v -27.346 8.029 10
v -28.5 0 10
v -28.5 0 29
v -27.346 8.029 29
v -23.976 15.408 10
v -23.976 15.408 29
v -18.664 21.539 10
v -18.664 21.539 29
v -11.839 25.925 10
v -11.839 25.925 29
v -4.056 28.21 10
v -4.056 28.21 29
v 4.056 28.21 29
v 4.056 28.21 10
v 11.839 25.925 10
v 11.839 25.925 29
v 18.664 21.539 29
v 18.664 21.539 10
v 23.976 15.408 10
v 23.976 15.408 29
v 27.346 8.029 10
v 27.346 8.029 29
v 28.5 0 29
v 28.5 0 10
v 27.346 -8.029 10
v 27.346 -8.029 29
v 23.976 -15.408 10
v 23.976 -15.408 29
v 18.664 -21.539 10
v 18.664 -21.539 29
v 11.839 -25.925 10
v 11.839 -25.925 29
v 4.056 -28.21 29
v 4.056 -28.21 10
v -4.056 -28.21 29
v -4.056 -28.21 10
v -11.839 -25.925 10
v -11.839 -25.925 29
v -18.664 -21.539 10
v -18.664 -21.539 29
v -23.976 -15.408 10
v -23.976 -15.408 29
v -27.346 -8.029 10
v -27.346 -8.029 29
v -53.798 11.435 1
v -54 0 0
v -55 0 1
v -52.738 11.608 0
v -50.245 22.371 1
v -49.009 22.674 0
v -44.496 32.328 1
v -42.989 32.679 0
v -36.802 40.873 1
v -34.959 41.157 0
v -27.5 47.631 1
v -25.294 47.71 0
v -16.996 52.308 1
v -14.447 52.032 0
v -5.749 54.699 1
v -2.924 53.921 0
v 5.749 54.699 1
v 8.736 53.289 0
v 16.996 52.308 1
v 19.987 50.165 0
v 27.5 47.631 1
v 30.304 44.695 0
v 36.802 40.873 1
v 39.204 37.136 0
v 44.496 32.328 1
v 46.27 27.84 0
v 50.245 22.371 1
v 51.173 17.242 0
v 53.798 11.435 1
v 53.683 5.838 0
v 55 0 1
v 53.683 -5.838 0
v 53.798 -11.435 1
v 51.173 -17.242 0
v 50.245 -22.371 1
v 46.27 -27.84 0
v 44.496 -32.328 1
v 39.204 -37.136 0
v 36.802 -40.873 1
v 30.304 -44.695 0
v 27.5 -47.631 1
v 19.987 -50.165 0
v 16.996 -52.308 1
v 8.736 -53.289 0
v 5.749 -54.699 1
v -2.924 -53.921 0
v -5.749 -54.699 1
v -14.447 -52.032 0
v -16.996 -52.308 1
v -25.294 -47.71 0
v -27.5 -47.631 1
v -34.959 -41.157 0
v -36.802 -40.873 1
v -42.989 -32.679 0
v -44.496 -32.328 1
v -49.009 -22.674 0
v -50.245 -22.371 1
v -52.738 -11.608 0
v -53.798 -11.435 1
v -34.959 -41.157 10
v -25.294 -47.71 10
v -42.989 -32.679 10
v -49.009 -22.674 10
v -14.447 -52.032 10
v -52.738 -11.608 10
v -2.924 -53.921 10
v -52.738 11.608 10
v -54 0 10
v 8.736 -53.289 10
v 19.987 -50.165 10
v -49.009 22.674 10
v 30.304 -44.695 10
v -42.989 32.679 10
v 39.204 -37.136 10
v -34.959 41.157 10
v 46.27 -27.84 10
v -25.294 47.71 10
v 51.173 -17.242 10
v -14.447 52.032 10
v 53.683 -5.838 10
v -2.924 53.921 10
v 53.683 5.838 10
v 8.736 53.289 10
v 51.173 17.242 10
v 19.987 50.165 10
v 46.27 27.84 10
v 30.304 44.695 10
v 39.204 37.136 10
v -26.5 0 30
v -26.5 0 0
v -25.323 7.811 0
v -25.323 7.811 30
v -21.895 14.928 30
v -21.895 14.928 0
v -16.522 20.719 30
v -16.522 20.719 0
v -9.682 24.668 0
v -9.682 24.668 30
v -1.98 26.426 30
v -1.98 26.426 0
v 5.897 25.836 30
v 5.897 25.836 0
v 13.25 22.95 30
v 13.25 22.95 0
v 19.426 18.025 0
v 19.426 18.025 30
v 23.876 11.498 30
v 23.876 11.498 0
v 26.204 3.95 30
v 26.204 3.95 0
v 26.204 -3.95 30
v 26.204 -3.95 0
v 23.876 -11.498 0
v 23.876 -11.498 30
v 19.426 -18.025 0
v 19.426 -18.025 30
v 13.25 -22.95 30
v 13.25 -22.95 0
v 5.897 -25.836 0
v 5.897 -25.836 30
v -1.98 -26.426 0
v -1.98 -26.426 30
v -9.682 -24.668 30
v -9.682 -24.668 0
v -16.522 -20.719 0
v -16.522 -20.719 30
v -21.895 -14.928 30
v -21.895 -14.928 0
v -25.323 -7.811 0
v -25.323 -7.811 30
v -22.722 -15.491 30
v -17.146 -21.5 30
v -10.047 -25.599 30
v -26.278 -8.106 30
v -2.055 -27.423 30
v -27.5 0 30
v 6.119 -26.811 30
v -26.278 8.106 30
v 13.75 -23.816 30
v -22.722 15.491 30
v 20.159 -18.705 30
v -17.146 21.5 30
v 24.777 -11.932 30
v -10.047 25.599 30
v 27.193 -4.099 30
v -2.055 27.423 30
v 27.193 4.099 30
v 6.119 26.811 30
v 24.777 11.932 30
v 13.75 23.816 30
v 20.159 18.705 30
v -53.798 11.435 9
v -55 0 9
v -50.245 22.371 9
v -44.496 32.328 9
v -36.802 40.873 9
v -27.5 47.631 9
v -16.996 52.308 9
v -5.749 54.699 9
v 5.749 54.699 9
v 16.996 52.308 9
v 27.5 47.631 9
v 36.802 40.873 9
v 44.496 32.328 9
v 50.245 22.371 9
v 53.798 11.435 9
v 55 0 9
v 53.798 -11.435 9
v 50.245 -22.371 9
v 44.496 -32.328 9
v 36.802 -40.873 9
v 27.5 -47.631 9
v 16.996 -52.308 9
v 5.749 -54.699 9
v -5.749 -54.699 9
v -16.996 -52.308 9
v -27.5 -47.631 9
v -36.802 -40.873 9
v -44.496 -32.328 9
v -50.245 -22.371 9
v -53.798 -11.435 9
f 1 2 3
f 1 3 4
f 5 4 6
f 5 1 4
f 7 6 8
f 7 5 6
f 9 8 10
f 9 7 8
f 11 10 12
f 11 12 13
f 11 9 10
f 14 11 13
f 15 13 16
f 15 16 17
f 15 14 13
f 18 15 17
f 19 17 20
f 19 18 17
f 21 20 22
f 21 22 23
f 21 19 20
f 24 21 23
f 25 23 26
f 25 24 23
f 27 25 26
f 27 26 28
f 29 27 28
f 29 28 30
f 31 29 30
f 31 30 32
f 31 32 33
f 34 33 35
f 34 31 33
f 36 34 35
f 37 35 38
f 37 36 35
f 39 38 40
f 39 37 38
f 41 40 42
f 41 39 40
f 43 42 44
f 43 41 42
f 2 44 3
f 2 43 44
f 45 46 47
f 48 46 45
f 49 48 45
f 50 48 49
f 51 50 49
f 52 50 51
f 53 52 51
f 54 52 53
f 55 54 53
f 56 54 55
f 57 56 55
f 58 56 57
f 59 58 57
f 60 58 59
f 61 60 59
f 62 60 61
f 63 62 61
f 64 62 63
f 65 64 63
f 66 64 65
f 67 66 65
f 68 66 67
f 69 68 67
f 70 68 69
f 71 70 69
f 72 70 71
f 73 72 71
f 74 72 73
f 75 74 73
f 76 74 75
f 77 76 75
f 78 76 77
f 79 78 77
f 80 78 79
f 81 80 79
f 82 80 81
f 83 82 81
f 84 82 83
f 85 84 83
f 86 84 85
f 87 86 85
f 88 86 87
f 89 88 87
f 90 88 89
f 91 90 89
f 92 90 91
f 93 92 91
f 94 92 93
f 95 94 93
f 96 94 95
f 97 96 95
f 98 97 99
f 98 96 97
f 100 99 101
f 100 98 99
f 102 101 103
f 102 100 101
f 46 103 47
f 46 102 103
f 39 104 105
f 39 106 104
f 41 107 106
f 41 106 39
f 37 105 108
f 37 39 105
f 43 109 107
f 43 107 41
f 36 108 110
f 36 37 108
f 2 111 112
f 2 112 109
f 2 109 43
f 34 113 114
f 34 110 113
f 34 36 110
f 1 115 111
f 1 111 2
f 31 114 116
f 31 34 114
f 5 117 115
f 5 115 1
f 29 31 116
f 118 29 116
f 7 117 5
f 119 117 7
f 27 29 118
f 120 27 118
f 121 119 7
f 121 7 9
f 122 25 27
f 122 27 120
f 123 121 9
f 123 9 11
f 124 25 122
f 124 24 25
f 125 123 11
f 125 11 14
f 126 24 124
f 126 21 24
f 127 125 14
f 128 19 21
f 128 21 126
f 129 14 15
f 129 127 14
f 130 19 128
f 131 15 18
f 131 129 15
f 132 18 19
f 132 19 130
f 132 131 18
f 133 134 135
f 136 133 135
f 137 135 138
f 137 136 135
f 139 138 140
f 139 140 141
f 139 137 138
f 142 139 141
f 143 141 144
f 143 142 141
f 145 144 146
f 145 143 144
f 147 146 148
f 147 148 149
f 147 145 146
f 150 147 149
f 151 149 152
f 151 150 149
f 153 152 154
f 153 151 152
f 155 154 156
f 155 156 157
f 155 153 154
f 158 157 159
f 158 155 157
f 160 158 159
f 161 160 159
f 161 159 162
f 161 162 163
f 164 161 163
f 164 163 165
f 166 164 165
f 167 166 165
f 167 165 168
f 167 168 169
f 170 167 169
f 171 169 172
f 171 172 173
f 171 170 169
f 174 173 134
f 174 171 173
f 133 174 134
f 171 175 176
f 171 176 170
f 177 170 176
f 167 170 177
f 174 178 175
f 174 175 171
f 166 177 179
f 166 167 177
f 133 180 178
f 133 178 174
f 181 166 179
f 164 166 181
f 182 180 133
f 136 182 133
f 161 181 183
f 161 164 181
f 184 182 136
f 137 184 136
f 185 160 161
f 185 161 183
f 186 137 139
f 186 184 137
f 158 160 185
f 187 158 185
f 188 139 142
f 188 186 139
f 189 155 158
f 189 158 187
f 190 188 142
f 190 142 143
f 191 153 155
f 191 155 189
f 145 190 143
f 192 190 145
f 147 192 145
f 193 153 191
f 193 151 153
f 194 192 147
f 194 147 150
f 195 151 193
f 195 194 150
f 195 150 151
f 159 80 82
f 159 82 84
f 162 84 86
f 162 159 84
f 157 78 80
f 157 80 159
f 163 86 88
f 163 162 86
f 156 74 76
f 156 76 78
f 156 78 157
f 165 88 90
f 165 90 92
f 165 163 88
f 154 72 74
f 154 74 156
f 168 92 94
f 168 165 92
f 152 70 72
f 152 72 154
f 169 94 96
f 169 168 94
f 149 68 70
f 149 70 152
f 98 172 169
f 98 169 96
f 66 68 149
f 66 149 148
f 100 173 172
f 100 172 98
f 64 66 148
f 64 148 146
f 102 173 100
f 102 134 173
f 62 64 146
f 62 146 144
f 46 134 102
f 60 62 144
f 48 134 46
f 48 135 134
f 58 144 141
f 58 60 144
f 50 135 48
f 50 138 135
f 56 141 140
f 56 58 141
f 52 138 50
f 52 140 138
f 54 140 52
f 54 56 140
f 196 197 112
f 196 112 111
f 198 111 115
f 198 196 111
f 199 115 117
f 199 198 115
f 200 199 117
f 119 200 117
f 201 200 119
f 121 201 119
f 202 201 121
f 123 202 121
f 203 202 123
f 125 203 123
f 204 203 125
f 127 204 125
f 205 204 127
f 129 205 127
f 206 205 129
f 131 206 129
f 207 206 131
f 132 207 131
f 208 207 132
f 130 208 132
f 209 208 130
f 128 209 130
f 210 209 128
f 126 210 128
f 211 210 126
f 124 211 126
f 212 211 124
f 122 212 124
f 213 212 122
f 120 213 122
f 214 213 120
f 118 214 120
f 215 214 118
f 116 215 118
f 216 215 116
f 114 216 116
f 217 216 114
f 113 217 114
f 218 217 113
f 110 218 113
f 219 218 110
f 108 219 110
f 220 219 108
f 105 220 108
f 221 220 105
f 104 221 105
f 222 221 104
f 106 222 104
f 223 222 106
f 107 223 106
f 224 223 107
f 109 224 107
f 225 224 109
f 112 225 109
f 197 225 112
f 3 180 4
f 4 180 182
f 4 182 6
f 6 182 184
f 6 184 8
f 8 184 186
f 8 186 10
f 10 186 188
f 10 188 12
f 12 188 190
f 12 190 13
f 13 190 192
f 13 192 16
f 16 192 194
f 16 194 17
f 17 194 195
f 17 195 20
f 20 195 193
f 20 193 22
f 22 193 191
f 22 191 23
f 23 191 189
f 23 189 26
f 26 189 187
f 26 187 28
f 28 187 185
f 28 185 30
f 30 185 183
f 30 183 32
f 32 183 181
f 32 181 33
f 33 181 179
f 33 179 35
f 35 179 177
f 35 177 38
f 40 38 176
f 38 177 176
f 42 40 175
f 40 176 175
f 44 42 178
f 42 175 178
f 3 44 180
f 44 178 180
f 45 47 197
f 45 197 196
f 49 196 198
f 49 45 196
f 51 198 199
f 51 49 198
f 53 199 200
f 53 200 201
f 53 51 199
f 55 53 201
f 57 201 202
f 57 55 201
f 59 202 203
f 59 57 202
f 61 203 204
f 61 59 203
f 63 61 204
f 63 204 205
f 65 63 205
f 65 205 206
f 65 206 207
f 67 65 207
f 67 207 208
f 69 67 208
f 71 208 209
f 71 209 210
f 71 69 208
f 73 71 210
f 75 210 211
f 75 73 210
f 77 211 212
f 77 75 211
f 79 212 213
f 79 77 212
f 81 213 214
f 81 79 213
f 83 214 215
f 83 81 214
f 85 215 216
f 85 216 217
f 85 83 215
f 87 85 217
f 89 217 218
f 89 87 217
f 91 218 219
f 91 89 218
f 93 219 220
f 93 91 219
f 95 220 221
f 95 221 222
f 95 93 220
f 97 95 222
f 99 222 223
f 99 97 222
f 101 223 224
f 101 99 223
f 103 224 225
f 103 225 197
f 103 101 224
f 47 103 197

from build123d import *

# Parameters (mm, degrees)
F2_SIZE = 1
F3_SIZE = 1


with BuildPart() as f1:
    # F0 (on Front) → F1 (revolve)
    with BuildSketch(Plane.XZ):
        Polygon((-28.5, 10), (-55, 10), (-55, 0), (-26.5, 0), (-26.5, 30), (-28.5, 30), align=None)
    revolve(axis=Axis((0, 0, 60.018875), (0, 0, -1)))

    # F2
    f2_edges = [f1.edges().sort_by_distance(p)[0] for p in [
        (55, 0, 10),
    ]]
    chamfer(f2_edges, length=F2_SIZE)

    # F3
    f3_edges = [f1.edges().sort_by_distance(p)[0] for p in [
        (28.5, 0, 30),
        (55, 0, 0),
    ]]
    chamfer(f3_edges, length=F3_SIZE)


solid = f1.part
